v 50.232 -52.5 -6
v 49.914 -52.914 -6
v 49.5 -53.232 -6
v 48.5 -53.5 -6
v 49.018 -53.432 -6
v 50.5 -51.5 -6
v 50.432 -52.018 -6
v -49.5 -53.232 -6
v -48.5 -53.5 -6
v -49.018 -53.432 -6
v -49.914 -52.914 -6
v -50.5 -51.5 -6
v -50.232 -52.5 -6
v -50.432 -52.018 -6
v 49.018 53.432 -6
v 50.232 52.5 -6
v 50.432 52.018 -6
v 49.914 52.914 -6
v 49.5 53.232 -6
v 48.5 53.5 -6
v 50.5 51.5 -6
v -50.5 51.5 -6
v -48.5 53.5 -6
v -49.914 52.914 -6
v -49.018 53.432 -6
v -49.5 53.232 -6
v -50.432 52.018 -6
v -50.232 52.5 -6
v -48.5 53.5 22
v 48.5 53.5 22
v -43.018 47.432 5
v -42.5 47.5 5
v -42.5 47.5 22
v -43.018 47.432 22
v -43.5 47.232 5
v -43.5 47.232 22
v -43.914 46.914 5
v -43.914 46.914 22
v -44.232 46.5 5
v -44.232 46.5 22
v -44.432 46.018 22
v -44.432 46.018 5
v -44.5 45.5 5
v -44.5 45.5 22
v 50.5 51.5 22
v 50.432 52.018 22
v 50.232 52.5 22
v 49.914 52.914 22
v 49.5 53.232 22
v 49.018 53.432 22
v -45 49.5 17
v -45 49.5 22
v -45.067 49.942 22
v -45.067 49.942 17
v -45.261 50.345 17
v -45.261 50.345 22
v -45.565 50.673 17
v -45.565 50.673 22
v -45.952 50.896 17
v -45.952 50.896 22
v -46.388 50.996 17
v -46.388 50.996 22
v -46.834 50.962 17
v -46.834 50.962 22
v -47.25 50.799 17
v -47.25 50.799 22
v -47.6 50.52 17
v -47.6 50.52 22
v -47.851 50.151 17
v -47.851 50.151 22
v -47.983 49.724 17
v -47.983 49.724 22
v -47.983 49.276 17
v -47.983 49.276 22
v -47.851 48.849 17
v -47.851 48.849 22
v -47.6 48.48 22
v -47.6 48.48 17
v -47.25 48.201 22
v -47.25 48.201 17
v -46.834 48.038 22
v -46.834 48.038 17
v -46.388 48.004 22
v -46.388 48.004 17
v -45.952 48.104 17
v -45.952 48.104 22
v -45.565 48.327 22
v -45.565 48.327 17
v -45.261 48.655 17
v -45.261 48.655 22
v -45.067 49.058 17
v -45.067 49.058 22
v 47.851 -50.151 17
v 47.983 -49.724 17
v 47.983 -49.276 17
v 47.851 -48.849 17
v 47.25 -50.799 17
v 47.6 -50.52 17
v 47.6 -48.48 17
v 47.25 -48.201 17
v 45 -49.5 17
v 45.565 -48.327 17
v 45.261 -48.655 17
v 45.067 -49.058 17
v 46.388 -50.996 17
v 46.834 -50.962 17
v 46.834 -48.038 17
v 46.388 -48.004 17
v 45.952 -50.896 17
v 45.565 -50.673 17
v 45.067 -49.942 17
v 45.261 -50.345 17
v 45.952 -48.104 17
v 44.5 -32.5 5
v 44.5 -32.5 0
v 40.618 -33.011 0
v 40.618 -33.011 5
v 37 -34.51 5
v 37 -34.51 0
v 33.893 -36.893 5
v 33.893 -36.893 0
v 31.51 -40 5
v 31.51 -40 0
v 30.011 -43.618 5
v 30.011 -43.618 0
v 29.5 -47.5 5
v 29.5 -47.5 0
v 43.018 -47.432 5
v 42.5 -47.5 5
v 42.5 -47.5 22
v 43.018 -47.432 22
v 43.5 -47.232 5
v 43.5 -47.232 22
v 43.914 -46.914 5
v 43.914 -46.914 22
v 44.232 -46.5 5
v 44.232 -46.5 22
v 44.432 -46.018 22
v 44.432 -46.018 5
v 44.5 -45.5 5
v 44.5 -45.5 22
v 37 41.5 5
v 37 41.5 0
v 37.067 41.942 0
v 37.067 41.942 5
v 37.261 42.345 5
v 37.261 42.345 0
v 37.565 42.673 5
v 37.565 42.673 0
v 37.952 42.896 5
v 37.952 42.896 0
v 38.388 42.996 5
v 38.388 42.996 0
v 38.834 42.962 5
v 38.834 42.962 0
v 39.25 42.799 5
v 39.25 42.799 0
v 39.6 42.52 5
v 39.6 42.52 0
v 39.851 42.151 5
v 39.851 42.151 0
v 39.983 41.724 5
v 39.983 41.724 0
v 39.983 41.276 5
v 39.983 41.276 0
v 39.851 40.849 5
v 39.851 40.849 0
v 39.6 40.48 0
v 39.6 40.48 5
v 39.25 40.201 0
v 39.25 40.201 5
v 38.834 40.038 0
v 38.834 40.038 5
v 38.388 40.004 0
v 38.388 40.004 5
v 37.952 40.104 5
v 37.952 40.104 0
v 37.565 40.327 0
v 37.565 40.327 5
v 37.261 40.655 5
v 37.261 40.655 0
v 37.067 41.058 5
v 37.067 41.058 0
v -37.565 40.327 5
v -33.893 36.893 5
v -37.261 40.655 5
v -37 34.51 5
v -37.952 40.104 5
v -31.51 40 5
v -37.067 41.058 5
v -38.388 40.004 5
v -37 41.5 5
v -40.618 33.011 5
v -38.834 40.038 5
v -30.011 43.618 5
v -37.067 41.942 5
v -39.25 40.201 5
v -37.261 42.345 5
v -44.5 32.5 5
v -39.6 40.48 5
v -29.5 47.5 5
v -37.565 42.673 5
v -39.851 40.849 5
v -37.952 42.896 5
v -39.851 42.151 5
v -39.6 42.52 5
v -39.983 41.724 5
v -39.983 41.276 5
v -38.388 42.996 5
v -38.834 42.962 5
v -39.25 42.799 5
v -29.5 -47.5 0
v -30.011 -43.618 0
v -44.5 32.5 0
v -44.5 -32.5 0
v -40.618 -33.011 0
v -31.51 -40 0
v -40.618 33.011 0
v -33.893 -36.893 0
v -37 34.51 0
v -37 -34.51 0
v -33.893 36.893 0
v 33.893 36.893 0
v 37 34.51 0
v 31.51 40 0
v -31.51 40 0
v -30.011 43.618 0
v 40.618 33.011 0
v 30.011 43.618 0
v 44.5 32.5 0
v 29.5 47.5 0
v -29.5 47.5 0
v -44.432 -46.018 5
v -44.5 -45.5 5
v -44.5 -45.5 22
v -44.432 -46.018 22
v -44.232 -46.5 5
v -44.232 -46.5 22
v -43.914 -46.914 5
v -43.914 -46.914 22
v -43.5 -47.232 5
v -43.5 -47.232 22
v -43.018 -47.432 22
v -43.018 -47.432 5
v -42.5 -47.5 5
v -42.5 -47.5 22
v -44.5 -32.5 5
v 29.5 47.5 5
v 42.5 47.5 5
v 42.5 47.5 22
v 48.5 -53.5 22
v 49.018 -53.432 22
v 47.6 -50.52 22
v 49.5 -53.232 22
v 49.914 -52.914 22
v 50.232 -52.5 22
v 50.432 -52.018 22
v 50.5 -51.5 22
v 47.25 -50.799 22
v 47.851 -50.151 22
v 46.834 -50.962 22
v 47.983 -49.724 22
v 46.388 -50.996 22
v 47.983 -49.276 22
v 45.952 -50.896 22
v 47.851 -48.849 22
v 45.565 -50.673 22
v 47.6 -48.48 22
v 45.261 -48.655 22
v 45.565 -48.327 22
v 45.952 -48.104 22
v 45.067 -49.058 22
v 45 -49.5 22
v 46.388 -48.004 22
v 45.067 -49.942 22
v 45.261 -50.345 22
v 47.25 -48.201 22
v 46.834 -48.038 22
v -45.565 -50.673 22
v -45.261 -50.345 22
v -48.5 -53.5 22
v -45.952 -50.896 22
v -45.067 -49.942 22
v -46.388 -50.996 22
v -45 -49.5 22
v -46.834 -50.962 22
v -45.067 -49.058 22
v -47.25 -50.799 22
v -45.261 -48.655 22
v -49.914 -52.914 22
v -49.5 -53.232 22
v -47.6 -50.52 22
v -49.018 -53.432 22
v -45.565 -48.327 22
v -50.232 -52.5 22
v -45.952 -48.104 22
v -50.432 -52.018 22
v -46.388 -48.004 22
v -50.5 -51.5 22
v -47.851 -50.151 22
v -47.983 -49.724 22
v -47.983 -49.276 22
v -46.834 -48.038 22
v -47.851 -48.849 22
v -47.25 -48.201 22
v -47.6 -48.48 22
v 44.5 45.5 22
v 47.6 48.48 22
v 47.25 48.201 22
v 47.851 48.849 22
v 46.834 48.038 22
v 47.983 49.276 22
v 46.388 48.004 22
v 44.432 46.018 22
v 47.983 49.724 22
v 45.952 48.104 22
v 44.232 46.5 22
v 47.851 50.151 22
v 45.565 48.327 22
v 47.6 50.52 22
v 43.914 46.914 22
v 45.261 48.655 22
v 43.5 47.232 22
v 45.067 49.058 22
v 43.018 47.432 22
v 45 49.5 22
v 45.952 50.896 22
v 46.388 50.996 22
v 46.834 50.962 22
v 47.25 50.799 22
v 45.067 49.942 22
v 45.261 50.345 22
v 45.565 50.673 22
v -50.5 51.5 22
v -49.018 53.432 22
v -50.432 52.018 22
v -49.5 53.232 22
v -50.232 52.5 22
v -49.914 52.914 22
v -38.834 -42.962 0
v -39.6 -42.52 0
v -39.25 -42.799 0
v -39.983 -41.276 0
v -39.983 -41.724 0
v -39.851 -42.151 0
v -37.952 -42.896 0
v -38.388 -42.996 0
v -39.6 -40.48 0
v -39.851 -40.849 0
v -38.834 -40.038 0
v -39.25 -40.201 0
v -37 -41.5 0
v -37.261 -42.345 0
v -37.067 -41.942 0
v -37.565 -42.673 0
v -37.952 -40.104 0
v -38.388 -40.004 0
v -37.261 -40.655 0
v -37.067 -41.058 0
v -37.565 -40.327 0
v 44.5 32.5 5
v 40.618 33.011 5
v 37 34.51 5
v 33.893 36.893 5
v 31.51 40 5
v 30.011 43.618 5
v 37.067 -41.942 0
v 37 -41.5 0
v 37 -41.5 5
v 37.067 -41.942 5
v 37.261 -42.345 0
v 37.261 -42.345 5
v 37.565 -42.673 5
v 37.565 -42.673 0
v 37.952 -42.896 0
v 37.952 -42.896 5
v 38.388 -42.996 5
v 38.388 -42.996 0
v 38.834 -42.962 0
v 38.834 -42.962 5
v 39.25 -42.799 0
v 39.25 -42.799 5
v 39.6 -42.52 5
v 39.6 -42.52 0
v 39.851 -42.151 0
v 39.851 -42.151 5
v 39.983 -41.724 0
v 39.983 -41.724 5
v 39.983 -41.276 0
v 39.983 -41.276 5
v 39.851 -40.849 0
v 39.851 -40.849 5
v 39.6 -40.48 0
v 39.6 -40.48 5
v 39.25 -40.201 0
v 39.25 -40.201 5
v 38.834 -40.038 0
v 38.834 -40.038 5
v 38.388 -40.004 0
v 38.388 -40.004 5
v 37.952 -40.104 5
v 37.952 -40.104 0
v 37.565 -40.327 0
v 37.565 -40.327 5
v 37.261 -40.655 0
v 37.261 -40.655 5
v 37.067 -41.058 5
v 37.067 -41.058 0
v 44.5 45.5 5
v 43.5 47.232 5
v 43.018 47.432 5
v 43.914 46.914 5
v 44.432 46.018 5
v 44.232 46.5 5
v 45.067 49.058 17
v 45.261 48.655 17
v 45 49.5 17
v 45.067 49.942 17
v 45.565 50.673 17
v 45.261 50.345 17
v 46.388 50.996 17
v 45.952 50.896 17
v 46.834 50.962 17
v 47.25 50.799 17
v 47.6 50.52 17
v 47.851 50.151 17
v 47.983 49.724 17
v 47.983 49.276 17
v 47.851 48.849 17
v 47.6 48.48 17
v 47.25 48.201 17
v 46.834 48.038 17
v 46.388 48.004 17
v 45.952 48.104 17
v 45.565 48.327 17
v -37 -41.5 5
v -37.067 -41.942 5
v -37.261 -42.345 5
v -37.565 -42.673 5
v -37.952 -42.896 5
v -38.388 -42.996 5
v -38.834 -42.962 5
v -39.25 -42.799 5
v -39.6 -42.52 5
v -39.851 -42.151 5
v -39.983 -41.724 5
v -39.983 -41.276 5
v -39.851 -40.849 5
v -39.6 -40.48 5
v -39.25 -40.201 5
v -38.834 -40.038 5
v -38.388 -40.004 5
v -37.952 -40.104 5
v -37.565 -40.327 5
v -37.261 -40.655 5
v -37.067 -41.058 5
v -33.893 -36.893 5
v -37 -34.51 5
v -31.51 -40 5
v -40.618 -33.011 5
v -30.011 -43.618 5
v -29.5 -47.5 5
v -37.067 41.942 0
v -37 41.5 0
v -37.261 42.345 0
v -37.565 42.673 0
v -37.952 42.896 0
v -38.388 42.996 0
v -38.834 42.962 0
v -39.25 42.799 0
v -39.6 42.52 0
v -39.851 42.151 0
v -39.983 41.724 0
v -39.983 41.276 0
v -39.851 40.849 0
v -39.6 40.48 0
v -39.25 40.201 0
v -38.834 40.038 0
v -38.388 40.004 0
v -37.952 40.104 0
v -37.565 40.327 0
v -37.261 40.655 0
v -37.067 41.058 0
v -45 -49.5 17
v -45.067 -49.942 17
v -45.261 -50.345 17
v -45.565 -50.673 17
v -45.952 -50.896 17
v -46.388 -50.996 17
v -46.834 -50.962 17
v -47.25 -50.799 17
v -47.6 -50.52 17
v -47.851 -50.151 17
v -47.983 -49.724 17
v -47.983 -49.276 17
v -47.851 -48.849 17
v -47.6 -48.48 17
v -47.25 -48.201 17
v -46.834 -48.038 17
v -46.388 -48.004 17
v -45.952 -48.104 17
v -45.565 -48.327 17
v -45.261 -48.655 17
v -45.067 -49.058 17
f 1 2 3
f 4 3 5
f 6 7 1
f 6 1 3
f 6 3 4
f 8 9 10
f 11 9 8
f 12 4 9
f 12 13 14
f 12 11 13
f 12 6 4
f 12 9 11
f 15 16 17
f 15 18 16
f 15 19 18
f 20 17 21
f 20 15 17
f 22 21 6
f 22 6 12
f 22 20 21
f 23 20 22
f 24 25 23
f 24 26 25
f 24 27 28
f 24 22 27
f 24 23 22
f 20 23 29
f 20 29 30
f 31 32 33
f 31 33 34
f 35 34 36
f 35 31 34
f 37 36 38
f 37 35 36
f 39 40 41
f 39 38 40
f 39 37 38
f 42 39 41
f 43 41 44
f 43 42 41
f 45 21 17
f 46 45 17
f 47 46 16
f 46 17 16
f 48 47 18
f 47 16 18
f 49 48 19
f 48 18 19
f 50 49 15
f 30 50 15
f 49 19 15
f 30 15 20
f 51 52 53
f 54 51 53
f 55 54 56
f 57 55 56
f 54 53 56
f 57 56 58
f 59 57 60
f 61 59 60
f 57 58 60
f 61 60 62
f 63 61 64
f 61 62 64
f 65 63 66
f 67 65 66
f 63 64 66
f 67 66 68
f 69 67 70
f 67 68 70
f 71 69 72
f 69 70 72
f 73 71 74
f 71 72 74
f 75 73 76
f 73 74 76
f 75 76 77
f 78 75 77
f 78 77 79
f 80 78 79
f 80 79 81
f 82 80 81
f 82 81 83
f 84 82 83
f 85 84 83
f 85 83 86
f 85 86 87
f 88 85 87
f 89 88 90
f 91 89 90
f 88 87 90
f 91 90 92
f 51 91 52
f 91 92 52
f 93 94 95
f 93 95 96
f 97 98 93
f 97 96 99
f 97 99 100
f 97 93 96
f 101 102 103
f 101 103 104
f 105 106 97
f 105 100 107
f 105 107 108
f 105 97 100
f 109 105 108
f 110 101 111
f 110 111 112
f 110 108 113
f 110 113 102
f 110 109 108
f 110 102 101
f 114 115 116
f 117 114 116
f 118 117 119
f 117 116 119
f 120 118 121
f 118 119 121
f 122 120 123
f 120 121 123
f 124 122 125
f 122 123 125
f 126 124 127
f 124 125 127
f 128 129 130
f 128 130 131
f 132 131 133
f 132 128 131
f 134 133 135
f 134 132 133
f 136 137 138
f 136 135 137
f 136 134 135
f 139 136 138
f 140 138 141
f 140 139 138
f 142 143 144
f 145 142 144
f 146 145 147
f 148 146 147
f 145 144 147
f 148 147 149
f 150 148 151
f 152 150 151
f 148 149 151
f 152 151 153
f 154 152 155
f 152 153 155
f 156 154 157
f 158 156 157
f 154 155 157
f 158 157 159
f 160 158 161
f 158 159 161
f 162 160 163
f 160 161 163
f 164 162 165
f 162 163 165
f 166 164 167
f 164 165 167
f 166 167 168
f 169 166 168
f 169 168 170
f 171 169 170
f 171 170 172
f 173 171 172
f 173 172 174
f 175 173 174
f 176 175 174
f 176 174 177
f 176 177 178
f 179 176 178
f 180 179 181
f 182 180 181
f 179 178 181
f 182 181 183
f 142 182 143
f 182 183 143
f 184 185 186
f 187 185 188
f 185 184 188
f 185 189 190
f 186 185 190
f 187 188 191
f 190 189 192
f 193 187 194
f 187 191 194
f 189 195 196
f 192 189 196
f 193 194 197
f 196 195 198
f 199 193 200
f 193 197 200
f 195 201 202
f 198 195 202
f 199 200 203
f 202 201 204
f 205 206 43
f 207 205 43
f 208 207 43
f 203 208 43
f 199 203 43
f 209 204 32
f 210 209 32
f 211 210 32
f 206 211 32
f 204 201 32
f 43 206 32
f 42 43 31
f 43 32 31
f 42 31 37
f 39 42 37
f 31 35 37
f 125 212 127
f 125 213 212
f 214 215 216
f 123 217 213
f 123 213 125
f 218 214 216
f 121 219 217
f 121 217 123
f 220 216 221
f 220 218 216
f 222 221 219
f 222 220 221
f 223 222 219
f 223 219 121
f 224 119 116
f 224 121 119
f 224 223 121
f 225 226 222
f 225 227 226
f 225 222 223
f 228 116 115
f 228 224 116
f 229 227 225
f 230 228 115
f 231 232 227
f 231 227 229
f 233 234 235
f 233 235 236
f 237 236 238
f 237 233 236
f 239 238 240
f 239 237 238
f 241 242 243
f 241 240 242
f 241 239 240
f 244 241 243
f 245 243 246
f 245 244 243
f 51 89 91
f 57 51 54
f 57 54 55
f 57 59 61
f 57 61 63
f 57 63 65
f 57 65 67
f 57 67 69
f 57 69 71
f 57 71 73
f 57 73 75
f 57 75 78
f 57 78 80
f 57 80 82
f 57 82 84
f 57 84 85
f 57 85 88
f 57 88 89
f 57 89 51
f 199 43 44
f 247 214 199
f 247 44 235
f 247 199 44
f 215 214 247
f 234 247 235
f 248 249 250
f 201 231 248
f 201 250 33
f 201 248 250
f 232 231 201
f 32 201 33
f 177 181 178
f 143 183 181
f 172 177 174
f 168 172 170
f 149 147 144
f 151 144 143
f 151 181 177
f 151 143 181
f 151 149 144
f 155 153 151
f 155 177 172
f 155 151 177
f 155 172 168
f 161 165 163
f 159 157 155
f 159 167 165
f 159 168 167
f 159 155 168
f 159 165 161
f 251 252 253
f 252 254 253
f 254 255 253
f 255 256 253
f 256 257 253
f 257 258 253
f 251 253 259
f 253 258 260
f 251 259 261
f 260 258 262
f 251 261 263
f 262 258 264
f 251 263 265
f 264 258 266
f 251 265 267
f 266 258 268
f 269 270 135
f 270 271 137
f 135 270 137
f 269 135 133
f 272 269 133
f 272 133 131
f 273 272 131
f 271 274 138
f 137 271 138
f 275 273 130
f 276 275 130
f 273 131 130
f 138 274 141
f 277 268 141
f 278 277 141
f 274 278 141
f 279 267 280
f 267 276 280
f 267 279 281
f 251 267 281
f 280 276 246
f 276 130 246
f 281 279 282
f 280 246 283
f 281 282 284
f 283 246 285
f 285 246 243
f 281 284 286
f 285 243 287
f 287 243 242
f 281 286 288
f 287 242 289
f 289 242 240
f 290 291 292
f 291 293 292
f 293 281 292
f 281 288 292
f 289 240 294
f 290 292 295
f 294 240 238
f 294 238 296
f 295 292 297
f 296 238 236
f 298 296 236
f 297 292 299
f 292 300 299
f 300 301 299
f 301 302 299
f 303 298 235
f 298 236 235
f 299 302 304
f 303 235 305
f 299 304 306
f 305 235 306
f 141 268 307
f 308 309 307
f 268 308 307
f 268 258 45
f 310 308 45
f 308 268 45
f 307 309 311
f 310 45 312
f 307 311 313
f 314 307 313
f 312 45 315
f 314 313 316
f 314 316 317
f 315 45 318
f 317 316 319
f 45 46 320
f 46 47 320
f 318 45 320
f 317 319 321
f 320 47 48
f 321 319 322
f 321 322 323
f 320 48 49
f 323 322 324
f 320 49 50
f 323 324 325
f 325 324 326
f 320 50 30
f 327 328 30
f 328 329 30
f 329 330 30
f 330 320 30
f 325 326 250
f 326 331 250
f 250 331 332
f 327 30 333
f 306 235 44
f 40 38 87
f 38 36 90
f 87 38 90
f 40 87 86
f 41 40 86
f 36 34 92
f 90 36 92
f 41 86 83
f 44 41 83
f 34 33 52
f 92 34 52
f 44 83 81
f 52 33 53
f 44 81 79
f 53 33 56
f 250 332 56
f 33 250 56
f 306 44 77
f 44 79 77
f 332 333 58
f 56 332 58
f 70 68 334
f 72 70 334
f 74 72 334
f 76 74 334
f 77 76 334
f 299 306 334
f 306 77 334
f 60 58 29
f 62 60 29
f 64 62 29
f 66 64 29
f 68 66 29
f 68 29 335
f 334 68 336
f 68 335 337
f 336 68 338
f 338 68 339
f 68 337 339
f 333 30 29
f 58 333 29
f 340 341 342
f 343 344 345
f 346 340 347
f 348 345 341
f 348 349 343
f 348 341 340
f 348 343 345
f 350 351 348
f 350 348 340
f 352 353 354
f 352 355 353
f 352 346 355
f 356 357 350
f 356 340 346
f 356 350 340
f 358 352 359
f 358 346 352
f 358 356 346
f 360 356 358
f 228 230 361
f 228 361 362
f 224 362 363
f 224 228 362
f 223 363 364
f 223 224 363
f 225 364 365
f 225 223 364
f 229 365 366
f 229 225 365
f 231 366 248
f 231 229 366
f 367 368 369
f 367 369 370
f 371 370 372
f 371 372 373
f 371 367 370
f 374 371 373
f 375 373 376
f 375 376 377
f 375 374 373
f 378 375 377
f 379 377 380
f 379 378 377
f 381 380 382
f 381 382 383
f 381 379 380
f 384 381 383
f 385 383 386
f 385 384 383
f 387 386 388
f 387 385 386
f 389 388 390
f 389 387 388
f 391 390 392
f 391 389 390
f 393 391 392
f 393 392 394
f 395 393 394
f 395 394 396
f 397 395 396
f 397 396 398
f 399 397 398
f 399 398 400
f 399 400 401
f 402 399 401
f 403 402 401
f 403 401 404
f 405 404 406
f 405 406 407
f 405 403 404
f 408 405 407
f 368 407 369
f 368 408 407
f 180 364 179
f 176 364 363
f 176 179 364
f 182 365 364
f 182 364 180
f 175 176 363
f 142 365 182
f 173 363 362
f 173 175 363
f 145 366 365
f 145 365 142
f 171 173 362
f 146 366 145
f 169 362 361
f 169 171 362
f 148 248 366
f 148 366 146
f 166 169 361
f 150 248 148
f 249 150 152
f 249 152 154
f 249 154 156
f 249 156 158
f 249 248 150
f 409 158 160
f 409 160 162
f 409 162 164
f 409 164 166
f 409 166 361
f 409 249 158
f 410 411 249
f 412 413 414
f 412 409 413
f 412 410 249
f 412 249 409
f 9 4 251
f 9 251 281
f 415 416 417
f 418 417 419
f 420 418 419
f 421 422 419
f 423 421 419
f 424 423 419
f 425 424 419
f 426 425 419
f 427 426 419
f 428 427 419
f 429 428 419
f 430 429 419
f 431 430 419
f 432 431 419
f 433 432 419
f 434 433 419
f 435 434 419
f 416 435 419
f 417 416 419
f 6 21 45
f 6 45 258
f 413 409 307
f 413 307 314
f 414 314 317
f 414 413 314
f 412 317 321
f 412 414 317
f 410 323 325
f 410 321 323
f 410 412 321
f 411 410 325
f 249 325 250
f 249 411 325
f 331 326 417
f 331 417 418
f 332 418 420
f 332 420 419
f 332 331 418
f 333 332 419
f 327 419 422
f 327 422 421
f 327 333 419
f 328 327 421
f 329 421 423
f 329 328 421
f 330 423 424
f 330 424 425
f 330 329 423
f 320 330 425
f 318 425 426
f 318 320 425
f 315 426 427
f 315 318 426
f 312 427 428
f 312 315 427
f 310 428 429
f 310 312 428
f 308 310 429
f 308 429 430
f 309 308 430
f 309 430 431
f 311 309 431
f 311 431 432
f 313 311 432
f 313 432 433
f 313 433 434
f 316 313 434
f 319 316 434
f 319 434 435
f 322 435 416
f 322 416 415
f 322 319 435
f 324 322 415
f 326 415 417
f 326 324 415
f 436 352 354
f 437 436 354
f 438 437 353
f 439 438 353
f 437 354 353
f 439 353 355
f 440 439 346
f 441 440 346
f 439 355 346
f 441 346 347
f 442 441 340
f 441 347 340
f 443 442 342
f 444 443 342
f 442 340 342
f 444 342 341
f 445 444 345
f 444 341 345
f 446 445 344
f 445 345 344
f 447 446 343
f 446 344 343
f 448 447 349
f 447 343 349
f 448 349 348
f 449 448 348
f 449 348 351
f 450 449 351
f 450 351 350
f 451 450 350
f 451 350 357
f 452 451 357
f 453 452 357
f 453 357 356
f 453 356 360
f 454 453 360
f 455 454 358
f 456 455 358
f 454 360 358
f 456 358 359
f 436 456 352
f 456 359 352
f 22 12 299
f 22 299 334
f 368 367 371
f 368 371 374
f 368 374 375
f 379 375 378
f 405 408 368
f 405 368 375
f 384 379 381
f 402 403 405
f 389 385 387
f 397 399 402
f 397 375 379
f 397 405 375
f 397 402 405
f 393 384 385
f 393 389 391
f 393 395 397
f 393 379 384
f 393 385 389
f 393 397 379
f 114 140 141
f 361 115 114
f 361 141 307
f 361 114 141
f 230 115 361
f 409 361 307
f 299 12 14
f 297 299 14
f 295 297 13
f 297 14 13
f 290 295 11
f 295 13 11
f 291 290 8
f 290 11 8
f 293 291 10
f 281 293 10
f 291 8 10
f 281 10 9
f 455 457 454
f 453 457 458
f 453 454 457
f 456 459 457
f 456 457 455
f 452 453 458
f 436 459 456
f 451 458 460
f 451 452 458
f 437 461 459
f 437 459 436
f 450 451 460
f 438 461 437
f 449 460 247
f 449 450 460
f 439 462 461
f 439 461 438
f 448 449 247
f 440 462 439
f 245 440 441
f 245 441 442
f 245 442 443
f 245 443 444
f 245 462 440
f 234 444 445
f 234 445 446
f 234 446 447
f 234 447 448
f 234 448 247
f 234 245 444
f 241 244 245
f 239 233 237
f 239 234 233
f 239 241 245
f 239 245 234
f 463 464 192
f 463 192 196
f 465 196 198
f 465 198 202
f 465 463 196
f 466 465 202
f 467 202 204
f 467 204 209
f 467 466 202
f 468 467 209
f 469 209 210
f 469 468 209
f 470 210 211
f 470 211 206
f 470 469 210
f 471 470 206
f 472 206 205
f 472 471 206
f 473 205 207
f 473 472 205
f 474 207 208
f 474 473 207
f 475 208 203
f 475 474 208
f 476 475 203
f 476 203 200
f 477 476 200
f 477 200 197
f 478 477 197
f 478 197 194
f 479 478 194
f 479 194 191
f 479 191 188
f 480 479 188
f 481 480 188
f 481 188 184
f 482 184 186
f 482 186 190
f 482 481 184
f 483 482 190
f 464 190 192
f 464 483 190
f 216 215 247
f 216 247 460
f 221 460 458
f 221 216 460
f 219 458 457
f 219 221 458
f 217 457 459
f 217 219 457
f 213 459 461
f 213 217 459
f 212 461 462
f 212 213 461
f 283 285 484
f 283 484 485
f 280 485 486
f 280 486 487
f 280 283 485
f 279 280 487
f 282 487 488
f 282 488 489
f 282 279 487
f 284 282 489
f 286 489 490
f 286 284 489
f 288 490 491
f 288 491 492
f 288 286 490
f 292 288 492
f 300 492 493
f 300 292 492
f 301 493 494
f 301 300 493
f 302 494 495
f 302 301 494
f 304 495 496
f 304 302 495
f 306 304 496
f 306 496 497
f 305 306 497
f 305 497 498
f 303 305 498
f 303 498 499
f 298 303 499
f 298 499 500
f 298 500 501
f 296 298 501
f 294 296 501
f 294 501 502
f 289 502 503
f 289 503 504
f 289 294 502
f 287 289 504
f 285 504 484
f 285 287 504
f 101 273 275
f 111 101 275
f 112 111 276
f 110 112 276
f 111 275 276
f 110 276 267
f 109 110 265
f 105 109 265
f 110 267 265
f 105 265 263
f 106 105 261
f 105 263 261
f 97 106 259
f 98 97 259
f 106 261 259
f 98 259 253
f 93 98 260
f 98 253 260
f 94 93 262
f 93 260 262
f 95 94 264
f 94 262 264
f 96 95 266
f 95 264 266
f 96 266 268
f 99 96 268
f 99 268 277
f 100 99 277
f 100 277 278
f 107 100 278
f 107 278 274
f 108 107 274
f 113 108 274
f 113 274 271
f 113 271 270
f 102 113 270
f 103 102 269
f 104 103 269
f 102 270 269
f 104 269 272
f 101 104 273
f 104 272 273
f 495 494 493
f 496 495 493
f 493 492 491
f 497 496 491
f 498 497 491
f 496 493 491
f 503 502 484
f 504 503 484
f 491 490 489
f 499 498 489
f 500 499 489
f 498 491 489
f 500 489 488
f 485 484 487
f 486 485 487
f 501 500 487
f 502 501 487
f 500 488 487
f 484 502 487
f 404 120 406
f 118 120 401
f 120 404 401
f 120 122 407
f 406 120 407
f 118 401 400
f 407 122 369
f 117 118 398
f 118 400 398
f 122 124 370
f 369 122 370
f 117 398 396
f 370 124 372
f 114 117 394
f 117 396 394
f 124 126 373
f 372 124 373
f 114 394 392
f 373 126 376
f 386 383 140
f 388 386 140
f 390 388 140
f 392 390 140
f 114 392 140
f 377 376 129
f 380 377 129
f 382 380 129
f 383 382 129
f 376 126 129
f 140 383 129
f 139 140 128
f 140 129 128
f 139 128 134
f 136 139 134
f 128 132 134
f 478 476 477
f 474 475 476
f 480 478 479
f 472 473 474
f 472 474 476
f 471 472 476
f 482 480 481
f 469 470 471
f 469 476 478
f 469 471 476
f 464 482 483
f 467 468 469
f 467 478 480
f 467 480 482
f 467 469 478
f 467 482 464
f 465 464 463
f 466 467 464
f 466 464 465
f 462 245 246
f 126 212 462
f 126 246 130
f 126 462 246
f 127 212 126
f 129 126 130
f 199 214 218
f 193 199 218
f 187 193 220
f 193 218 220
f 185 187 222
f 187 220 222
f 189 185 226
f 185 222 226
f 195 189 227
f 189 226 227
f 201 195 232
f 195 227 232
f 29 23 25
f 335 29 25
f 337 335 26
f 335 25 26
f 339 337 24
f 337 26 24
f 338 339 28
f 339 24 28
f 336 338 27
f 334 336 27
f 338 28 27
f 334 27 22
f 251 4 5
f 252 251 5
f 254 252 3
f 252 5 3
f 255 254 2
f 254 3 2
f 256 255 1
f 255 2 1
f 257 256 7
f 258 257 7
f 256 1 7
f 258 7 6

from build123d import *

# Parameters (mm, degrees)
PAD_DEPTH                     = 28
POCKET_DEPTH                  = 22.001
SKETCH004_R                   = 1.5
PAD001_DEPTH                  = 5
SKETCH004_MIRRORED_2_R        = 1.5
PAD001_MIRRORED_2_DEPTH       = 5
SKETCH005_R                   = 1.5
POCKET001_DEPTH               = 5
SKETCH005_MIRRORED002_2_R     = 1.5
POCKET001_MIRRORED002_2_DEPTH = 5


with BuildPart() as part:
    # Sketch001 → Pad (new body)
    with BuildSketch(Plane.XY.offset(-6)):
        with BuildLine():
            Line((-48.5, 53.5), (48.5, 53.5))
            ThreePointArc((50.5, 51.5), (49.914214, 52.914214), (48.5, 53.5))
            Line((50.5, 51.5), (50.5, -51.5))
            ThreePointArc((48.5, -53.5), (49.914214, -52.914214), (50.5, -51.5))
            Line((48.5, -53.5), (-48.5, -53.5))
            ThreePointArc((-50.5, -51.5), (-49.914214, -52.914214), (-48.5, -53.5))
            Line((-50.5, -51.5), (-50.5, 51.5))
            ThreePointArc((-48.5, 53.5), (-49.914214, 52.914214), (-50.5, 51.5))
        make_face()
    extrude(amount=PAD_DEPTH)

    # Sketch002 → Pocket (cut, through all)
    with BuildSketch(Plane.XY):
        with BuildLine():
            Line((42.5, 47.5), (-42.5, 47.5))
            ThreePointArc((-42.5, 47.5), (-43.914214, 46.914214), (-44.5, 45.5))
            Line((-44.5, 45.5), (-44.5, -45.5))
            ThreePointArc((-44.5, -45.5), (-43.914214, -46.914214), (-42.5, -47.5))
            Line((-42.5, -47.5), (42.5, -47.5))
            ThreePointArc((42.5, -47.5), (43.914214, -46.914214), (44.5, -45.5))
            Line((44.5, -45.5), (44.5, 45.5))
            ThreePointArc((44.5, 45.5), (43.914214, 46.914214), (42.5, 47.5))
        make_face()
    extrude(amount=POCKET_DEPTH, mode=Mode.SUBTRACT)

    # Sketch004 → Pad001 (join)
    with BuildSketch(Plane.XY):
        with BuildLine():
            Line((-44.5, 47.5), (-29.5, 47.5))
            ThreePointArc((-44.5, 32.5), (-33.893398, 36.893398), (-29.5, 47.5))
            Line((-44.5, 47.5), (-44.5, 32.5))
        make_face()
        with Locations((-38.5, 41.5)):
            Circle(SKETCH004_R, mode=Mode.SUBTRACT)
    pad001 = extrude(amount=PAD001_DEPTH)

    # Sketch004 Mirrored 2 → Pad001 Mirrored 2 (add)
    with BuildSketch(Plane(origin=(0, 0, 0), x_dir=(-1, 0, 0), z_dir=(0, 0, -1))):
        with BuildLine():
            Line((-44.5, 47.5), (-29.5, 47.5))
            ThreePointArc((-44.5, 32.5), (-33.893398, 36.893398), (-29.5, 47.5))
            Line((-44.5, 47.5), (-44.5, 32.5))
        make_face()
        with Locations((-38.5, 41.5)):
            Circle(SKETCH004_MIRRORED_2_R, mode=Mode.SUBTRACT)
    pad001_mirrored_2 = extrude(amount=-PAD001_MIRRORED_2_DEPTH)

    # Mirrored001: Pad001, Pad001 Mirrored 2 across Sketch004 H_Axis
    add(pad001.mirror(Plane.ZX))
    add(pad001_mirrored_2.mirror(Plane.ZX))

    # Sketch005 → Pocket001 (cut)
    with BuildSketch(Plane.XY.offset(22)):
        with Locations((-46.5, 49.5)):
            Circle(SKETCH005_R)
    pocket001 = extrude(amount=-POCKET001_DEPTH, mode=Mode.SUBTRACT)

    # Sketch005 Mirrored002 2 → Pocket001 Mirrored002 2 (cut)
    with BuildSketch(Plane(origin=(0, 0, 22), x_dir=(-1, 0, 0), z_dir=(0, 0, -1))):
        with Locations((-46.5, 49.5)):
            Circle(SKETCH005_MIRRORED002_2_R)
    pocket001_mirrored002_2 = extrude(amount=POCKET001_MIRRORED002_2_DEPTH, mode=Mode.SUBTRACT)

    # Mirrored003: Pocket001, Pocket001 Mirrored002 2 across Sketch005 H_Axis
    add(pocket001.mirror(Plane(origin=(0, 0, 22), x_dir=(0, 0, 1), z_dir=(0, 1, 0))), mode=Mode.SUBTRACT)
    add(pocket001_mirrored002_2.mirror(Plane(origin=(0, 0, 22), x_dir=(0, 0, 1), z_dir=(0, 1, 0))), mode=Mode.SUBTRACT)


solid = part.part
